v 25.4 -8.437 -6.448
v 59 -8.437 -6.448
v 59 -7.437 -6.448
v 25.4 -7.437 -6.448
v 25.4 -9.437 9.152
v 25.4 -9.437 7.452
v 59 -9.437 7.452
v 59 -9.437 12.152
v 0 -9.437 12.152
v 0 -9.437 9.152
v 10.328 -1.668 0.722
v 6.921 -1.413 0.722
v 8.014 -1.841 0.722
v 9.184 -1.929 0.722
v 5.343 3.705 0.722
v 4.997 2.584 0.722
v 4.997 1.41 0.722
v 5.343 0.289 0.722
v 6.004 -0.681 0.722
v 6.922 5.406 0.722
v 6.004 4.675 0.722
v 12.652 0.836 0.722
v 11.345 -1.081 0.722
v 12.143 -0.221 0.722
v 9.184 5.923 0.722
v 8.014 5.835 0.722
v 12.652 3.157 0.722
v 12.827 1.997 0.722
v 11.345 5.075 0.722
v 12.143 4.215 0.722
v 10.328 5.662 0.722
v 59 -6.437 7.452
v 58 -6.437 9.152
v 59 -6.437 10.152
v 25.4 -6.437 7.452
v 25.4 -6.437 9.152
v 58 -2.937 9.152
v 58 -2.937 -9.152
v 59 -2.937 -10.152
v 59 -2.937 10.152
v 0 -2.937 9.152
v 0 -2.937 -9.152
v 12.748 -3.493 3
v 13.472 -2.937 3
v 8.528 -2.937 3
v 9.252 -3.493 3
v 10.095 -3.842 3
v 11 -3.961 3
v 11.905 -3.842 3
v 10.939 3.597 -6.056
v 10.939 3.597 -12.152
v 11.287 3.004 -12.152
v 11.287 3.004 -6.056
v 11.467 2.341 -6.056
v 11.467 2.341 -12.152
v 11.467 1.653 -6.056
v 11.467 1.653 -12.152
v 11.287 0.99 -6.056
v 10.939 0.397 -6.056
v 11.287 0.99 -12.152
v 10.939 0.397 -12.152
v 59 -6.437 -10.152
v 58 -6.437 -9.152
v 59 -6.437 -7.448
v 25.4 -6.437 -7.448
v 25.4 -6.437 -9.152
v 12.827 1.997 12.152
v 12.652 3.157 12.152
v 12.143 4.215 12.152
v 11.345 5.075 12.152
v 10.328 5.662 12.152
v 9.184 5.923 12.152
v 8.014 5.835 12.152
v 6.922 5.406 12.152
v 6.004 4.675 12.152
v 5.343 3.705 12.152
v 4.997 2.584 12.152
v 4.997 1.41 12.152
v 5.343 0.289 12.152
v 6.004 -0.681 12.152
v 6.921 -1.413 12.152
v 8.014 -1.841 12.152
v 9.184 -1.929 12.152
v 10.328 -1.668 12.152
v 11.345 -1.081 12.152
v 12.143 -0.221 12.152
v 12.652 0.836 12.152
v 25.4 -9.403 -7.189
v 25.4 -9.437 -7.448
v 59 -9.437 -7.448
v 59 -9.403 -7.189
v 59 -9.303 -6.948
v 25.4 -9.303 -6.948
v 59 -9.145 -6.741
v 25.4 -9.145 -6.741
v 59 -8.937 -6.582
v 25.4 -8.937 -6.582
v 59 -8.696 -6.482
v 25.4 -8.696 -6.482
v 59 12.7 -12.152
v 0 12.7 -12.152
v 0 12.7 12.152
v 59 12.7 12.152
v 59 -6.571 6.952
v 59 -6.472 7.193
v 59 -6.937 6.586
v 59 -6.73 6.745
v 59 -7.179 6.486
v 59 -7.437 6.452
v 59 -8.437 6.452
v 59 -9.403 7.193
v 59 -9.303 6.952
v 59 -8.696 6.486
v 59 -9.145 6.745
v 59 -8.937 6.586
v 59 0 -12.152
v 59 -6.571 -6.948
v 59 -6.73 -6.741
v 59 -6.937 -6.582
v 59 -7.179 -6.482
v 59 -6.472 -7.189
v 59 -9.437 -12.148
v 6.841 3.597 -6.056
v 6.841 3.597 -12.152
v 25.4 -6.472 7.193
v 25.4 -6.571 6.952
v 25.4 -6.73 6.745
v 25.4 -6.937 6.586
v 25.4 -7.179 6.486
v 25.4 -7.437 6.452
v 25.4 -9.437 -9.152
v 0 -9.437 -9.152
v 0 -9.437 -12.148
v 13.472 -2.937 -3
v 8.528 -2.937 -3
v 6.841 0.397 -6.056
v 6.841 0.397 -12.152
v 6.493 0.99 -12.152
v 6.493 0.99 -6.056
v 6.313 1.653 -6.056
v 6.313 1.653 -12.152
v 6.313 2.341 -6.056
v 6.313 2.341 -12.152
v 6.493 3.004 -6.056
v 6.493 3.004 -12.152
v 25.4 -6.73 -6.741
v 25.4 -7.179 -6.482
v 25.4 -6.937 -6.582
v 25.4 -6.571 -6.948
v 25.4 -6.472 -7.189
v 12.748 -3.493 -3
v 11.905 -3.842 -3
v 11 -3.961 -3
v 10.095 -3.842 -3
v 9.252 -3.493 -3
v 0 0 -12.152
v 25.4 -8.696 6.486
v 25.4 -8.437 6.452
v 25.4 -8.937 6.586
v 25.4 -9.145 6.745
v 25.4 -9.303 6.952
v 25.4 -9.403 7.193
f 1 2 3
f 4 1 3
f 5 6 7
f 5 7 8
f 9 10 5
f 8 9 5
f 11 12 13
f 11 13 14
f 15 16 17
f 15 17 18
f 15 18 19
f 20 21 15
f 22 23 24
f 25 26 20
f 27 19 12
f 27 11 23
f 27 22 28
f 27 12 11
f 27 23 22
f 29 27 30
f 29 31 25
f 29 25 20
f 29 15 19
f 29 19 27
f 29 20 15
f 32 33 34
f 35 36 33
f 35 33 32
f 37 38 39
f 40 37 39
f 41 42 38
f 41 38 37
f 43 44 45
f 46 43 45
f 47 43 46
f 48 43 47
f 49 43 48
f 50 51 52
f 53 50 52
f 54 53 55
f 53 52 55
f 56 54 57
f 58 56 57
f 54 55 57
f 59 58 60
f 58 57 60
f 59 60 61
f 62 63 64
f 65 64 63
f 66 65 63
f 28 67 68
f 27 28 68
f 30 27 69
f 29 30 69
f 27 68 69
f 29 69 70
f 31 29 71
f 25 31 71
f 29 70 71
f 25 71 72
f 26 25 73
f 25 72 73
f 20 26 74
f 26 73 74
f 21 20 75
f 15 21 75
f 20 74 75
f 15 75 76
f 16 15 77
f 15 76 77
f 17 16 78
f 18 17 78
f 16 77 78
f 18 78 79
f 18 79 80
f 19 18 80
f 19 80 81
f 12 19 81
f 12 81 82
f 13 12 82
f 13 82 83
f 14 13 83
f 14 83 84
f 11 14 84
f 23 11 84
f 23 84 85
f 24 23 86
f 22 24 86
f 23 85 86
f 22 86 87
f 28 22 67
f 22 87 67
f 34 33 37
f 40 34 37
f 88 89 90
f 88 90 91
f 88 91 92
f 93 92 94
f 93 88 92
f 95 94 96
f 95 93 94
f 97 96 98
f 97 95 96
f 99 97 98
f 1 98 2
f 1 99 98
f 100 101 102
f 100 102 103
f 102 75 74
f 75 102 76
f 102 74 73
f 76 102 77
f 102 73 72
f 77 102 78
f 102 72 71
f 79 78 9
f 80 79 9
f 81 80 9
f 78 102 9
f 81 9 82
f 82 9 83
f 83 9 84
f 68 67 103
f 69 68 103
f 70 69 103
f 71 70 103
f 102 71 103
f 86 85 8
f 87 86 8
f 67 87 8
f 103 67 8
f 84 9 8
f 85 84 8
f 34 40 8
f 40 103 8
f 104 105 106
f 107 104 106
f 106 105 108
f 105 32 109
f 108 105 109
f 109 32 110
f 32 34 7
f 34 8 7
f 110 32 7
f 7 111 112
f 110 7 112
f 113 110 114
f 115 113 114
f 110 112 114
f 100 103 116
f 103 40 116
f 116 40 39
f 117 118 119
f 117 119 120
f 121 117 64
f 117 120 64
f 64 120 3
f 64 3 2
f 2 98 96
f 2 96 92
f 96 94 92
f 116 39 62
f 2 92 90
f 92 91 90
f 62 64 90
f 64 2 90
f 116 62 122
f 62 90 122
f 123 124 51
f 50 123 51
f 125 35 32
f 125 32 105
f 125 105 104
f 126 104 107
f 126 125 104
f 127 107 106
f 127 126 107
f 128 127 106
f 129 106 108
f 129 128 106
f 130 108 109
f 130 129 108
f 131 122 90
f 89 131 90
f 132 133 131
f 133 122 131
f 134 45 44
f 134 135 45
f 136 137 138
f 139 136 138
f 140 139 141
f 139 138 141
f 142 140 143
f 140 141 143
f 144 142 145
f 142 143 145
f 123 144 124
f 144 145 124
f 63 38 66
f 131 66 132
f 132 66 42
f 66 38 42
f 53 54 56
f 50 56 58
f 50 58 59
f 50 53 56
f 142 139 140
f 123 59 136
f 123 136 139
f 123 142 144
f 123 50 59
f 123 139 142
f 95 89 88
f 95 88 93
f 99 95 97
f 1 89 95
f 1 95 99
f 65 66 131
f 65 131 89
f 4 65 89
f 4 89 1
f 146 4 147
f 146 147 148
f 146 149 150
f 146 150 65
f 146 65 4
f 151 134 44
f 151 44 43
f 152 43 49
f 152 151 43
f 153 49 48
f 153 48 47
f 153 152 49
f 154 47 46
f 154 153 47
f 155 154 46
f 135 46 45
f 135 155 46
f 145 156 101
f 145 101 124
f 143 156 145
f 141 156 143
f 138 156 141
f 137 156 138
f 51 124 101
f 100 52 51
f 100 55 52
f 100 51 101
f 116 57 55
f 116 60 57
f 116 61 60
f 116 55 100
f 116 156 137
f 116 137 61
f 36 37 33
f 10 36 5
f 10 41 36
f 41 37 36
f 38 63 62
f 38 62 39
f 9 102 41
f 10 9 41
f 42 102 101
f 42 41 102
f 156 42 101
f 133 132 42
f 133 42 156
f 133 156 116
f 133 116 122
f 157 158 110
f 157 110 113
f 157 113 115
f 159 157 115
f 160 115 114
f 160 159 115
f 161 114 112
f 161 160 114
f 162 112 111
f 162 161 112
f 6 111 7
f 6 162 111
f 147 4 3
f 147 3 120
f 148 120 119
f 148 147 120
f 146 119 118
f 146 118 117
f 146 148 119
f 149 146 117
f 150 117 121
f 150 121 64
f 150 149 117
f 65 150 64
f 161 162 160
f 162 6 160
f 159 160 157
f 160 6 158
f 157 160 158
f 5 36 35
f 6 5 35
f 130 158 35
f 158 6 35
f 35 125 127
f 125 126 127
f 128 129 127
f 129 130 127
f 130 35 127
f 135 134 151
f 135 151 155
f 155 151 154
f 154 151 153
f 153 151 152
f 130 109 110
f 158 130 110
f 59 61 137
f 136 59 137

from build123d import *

# Parameters (mm, degrees)
BOSS_EXTRUDE1_DEPTH      = 59
SKETCH2_W                = 59
SKETCH2_H                = 3.5
BOSS_EXTRUDE2_DEPTH      = 1
CHAMFER1_SIZE            = 1
CHAMFER1_OF_MIRROR3_SIZE = 1
BOSS_EXTRUDE3_DEPTH      = 3
SKETCH4_W                = 59
SKETCH4_H                = 24.303864374
BOSS_EXTRUDE4_DEPTH      = 12.7
CUT_EXTRUDE1_DEPTH       = 6.096
SKETCH8_R                = 3.937
CUT_EXTRUDE2_DEPTH       = 11.43
CUT_EXTRUDE3_DEPTH       = 25.4


with BuildPart() as part:
    # Sketch1 → Boss-Extrude1 (new body)
    with BuildSketch(Plane(origin=(0, 0, 0), x_dir=(0, 0, -1), z_dir=(1, 0, 0))):
        with BuildLine():
            Line((12.151932187, 0), (12.148068004, -9.437434945))
            Line((12.148068004, -9.437434945), (7.448068195, -9.437434945))
            ThreePointArc((7.448068195, -9.437434945), (6.740961414, -9.144541726), (6.448068195, -8.437434945))
            Line((6.448068195, -8.437434945), (6.448068195, -7.437434945))
            ThreePointArc((6.448068195, -7.437434945), (6.740961414, -6.730328164), (7.448068195, -6.437434945))
            Line((7.448068195, -6.437434945), (10.148068004, -6.437434945))
            Line((10.148068004, -6.437434945), (10.148068004, -2.937434945))
            Line((10.148068004, -2.937434945), (-10.151932187, -2.937434945))
            Line((-10.151932187, -2.937434945), (-10.151932187, -6.437434945))
            Line((-10.151932187, -6.437434945), (-7.451931901, -6.437434945))
            ThreePointArc((-7.451931901, -6.437434945), (-6.744825119, -6.730328164), (-6.451931901, -7.437434945))
            Line((-6.451931901, -7.437434945), (-6.451931901, -8.437434945))
            ThreePointArc((-6.451931901, -8.437434945), (-6.744825119, -9.144541727), (-7.451931901, -9.437434945))
            Line((-7.451931901, -9.437434945), (-12.151932187, -9.437434945))
            Line((-12.151932187, -9.437434945), (-12.151932187, 0))
            Line((-12.151932187, 0), (12.151932187, 0))
        make_face()
    extrude(amount=BOSS_EXTRUDE1_DEPTH)

    # Sketch2 → Boss-Extrude2 (add)
    with BuildSketch(Plane(origin=(0, 0, 10.151932187), x_dir=(-1, 0, 0), z_dir=(0, 0, -1))):
        with Locations((-29.5, -4.687434945)):
            Rectangle(SKETCH2_W, SKETCH2_H)
    boss_extrude2 = extrude(amount=BOSS_EXTRUDE2_DEPTH)

    # Chamfer1
    chamfer1_edges = [part.edges().sort_by_distance(p)[0] for p in [
        (59, -4.687434945, 9.151932187),
    ]]
    chamfer(chamfer1_edges, length=CHAMFER1_SIZE)

    # Mirror3: Boss-Extrude2 across plane
    add(boss_extrude2.mirror(Plane.XY))

    # Chamfer1 of Mirror3
    chamfer1_of_mirror3_edges = [part.edges().sort_by_distance(p)[0] for p in [
        (59, -4.687434945, -9.151932187),
    ]]
    chamfer(chamfer1_of_mirror3_edges, length=CHAMFER1_OF_MIRROR3_SIZE)

    # Sketch4 → Boss-Extrude4 (add)
    with BuildSketch(Plane(origin=(0, 0, 0), x_dir=(1, 0, 0), z_dir=(0, 1, 0))):
        with Locations((29.5, 0)):
            Rectangle(SKETCH4_W, SKETCH4_H)
    extrude(amount=BOSS_EXTRUDE4_DEPTH)

    # Sketch5 → Cut-Extrude1 (cut)
    with BuildSketch(Plane(origin=(0, 0, -12.151932187), x_dir=(-1, 0, 0), z_dir=(0, 0, -1))):
        with BuildLine():
            Line((-6.840609847, 3.596945044), (-10.939390153, 3.596945044))
            ThreePointArc((-10.939390153, 3.596945044), (-11.49, 1.996945044), (-10.939390153, 0.396945044))
            Line((-10.939390153, 0.396945044), (-6.840609847, 0.396945044))
            ThreePointArc((-6.840609847, 0.396945044), (-6.29, 1.996945044), (-6.840609847, 3.596945044))
        make_face()
    extrude(amount=-CUT_EXTRUDE1_DEPTH, mode=Mode.SUBTRACT)

    # Sketch8 → Cut-Extrude2 (cut)
    with BuildSketch(Plane.XY.offset(12.151932187)):
        with Locations((8.89, 1.996945044)):
            Circle(SKETCH8_R)
    extrude(amount=-CUT_EXTRUDE2_DEPTH, mode=Mode.SUBTRACT)

    # Sketch9 → Cut-Extrude3 (cut)
    with BuildSketch(Plane.ZY):
        with BuildLine():
            Line((-9.151932187, -6.437434945), (-9.151932187, -9.437434945))
            Line((-9.151932187, -9.437434945), (-7.448068195, -9.437434945))
            ThreePointArc((-7.448068195, -9.437434945), (-6.740961414, -9.144541726), (-6.448068195, -8.437434945))
            Line((-6.448068195, -8.437434945), (-6.448068195, -7.437434945))
            ThreePointArc((-6.448068195, -7.437434945), (-6.740961414, -6.730328164), (-7.448068195, -6.437434945))
            Line((-7.448068195, -6.437434945), (-9.151932187, -6.437434945))
        make_face()
        with BuildLine():
            Line((9.151932187, -9.437434945), (7.448068195, -9.437434945))
            ThreePointArc((7.448068195, -9.437434945), (6.740961414, -9.144541726), (6.448068195, -8.437434945))
            Line((6.448068195, -8.437434945), (6.448068195, -7.437434945))
            ThreePointArc((6.448068195, -7.437434945), (6.740961414, -6.730328164), (7.448068195, -6.437434945))
            Line((7.448068195, -6.437434945), (9.151932187, -6.437434945))
            Line((9.151932187, -6.437434945), (9.151932187, -9.437434945))
        make_face()
    extrude(amount=-CUT_EXTRUDE3_DEPTH, mode=Mode.SUBTRACT)


with BuildPart() as body_2:
    # Sketch3 → Boss-Extrude3 (new, symmetric)
    with BuildSketch(Plane(origin=(9.151932187, 0, 0), x_dir=(-1, 0, 0), z_dir=(0, 0, -1))):
        with BuildLine():
            Line((0.623772187, -2.937434945), (-4.319907813, -2.937434945))
            ThreePointArc((-4.319907813, -2.937434945), (-1.848067813, -3.961304597), (0.623772187, -2.937434945))
        make_face()
    extrude(amount=BOSS_EXTRUDE3_DEPTH, both=True)


solid = Compound([part.part, body_2.part])
